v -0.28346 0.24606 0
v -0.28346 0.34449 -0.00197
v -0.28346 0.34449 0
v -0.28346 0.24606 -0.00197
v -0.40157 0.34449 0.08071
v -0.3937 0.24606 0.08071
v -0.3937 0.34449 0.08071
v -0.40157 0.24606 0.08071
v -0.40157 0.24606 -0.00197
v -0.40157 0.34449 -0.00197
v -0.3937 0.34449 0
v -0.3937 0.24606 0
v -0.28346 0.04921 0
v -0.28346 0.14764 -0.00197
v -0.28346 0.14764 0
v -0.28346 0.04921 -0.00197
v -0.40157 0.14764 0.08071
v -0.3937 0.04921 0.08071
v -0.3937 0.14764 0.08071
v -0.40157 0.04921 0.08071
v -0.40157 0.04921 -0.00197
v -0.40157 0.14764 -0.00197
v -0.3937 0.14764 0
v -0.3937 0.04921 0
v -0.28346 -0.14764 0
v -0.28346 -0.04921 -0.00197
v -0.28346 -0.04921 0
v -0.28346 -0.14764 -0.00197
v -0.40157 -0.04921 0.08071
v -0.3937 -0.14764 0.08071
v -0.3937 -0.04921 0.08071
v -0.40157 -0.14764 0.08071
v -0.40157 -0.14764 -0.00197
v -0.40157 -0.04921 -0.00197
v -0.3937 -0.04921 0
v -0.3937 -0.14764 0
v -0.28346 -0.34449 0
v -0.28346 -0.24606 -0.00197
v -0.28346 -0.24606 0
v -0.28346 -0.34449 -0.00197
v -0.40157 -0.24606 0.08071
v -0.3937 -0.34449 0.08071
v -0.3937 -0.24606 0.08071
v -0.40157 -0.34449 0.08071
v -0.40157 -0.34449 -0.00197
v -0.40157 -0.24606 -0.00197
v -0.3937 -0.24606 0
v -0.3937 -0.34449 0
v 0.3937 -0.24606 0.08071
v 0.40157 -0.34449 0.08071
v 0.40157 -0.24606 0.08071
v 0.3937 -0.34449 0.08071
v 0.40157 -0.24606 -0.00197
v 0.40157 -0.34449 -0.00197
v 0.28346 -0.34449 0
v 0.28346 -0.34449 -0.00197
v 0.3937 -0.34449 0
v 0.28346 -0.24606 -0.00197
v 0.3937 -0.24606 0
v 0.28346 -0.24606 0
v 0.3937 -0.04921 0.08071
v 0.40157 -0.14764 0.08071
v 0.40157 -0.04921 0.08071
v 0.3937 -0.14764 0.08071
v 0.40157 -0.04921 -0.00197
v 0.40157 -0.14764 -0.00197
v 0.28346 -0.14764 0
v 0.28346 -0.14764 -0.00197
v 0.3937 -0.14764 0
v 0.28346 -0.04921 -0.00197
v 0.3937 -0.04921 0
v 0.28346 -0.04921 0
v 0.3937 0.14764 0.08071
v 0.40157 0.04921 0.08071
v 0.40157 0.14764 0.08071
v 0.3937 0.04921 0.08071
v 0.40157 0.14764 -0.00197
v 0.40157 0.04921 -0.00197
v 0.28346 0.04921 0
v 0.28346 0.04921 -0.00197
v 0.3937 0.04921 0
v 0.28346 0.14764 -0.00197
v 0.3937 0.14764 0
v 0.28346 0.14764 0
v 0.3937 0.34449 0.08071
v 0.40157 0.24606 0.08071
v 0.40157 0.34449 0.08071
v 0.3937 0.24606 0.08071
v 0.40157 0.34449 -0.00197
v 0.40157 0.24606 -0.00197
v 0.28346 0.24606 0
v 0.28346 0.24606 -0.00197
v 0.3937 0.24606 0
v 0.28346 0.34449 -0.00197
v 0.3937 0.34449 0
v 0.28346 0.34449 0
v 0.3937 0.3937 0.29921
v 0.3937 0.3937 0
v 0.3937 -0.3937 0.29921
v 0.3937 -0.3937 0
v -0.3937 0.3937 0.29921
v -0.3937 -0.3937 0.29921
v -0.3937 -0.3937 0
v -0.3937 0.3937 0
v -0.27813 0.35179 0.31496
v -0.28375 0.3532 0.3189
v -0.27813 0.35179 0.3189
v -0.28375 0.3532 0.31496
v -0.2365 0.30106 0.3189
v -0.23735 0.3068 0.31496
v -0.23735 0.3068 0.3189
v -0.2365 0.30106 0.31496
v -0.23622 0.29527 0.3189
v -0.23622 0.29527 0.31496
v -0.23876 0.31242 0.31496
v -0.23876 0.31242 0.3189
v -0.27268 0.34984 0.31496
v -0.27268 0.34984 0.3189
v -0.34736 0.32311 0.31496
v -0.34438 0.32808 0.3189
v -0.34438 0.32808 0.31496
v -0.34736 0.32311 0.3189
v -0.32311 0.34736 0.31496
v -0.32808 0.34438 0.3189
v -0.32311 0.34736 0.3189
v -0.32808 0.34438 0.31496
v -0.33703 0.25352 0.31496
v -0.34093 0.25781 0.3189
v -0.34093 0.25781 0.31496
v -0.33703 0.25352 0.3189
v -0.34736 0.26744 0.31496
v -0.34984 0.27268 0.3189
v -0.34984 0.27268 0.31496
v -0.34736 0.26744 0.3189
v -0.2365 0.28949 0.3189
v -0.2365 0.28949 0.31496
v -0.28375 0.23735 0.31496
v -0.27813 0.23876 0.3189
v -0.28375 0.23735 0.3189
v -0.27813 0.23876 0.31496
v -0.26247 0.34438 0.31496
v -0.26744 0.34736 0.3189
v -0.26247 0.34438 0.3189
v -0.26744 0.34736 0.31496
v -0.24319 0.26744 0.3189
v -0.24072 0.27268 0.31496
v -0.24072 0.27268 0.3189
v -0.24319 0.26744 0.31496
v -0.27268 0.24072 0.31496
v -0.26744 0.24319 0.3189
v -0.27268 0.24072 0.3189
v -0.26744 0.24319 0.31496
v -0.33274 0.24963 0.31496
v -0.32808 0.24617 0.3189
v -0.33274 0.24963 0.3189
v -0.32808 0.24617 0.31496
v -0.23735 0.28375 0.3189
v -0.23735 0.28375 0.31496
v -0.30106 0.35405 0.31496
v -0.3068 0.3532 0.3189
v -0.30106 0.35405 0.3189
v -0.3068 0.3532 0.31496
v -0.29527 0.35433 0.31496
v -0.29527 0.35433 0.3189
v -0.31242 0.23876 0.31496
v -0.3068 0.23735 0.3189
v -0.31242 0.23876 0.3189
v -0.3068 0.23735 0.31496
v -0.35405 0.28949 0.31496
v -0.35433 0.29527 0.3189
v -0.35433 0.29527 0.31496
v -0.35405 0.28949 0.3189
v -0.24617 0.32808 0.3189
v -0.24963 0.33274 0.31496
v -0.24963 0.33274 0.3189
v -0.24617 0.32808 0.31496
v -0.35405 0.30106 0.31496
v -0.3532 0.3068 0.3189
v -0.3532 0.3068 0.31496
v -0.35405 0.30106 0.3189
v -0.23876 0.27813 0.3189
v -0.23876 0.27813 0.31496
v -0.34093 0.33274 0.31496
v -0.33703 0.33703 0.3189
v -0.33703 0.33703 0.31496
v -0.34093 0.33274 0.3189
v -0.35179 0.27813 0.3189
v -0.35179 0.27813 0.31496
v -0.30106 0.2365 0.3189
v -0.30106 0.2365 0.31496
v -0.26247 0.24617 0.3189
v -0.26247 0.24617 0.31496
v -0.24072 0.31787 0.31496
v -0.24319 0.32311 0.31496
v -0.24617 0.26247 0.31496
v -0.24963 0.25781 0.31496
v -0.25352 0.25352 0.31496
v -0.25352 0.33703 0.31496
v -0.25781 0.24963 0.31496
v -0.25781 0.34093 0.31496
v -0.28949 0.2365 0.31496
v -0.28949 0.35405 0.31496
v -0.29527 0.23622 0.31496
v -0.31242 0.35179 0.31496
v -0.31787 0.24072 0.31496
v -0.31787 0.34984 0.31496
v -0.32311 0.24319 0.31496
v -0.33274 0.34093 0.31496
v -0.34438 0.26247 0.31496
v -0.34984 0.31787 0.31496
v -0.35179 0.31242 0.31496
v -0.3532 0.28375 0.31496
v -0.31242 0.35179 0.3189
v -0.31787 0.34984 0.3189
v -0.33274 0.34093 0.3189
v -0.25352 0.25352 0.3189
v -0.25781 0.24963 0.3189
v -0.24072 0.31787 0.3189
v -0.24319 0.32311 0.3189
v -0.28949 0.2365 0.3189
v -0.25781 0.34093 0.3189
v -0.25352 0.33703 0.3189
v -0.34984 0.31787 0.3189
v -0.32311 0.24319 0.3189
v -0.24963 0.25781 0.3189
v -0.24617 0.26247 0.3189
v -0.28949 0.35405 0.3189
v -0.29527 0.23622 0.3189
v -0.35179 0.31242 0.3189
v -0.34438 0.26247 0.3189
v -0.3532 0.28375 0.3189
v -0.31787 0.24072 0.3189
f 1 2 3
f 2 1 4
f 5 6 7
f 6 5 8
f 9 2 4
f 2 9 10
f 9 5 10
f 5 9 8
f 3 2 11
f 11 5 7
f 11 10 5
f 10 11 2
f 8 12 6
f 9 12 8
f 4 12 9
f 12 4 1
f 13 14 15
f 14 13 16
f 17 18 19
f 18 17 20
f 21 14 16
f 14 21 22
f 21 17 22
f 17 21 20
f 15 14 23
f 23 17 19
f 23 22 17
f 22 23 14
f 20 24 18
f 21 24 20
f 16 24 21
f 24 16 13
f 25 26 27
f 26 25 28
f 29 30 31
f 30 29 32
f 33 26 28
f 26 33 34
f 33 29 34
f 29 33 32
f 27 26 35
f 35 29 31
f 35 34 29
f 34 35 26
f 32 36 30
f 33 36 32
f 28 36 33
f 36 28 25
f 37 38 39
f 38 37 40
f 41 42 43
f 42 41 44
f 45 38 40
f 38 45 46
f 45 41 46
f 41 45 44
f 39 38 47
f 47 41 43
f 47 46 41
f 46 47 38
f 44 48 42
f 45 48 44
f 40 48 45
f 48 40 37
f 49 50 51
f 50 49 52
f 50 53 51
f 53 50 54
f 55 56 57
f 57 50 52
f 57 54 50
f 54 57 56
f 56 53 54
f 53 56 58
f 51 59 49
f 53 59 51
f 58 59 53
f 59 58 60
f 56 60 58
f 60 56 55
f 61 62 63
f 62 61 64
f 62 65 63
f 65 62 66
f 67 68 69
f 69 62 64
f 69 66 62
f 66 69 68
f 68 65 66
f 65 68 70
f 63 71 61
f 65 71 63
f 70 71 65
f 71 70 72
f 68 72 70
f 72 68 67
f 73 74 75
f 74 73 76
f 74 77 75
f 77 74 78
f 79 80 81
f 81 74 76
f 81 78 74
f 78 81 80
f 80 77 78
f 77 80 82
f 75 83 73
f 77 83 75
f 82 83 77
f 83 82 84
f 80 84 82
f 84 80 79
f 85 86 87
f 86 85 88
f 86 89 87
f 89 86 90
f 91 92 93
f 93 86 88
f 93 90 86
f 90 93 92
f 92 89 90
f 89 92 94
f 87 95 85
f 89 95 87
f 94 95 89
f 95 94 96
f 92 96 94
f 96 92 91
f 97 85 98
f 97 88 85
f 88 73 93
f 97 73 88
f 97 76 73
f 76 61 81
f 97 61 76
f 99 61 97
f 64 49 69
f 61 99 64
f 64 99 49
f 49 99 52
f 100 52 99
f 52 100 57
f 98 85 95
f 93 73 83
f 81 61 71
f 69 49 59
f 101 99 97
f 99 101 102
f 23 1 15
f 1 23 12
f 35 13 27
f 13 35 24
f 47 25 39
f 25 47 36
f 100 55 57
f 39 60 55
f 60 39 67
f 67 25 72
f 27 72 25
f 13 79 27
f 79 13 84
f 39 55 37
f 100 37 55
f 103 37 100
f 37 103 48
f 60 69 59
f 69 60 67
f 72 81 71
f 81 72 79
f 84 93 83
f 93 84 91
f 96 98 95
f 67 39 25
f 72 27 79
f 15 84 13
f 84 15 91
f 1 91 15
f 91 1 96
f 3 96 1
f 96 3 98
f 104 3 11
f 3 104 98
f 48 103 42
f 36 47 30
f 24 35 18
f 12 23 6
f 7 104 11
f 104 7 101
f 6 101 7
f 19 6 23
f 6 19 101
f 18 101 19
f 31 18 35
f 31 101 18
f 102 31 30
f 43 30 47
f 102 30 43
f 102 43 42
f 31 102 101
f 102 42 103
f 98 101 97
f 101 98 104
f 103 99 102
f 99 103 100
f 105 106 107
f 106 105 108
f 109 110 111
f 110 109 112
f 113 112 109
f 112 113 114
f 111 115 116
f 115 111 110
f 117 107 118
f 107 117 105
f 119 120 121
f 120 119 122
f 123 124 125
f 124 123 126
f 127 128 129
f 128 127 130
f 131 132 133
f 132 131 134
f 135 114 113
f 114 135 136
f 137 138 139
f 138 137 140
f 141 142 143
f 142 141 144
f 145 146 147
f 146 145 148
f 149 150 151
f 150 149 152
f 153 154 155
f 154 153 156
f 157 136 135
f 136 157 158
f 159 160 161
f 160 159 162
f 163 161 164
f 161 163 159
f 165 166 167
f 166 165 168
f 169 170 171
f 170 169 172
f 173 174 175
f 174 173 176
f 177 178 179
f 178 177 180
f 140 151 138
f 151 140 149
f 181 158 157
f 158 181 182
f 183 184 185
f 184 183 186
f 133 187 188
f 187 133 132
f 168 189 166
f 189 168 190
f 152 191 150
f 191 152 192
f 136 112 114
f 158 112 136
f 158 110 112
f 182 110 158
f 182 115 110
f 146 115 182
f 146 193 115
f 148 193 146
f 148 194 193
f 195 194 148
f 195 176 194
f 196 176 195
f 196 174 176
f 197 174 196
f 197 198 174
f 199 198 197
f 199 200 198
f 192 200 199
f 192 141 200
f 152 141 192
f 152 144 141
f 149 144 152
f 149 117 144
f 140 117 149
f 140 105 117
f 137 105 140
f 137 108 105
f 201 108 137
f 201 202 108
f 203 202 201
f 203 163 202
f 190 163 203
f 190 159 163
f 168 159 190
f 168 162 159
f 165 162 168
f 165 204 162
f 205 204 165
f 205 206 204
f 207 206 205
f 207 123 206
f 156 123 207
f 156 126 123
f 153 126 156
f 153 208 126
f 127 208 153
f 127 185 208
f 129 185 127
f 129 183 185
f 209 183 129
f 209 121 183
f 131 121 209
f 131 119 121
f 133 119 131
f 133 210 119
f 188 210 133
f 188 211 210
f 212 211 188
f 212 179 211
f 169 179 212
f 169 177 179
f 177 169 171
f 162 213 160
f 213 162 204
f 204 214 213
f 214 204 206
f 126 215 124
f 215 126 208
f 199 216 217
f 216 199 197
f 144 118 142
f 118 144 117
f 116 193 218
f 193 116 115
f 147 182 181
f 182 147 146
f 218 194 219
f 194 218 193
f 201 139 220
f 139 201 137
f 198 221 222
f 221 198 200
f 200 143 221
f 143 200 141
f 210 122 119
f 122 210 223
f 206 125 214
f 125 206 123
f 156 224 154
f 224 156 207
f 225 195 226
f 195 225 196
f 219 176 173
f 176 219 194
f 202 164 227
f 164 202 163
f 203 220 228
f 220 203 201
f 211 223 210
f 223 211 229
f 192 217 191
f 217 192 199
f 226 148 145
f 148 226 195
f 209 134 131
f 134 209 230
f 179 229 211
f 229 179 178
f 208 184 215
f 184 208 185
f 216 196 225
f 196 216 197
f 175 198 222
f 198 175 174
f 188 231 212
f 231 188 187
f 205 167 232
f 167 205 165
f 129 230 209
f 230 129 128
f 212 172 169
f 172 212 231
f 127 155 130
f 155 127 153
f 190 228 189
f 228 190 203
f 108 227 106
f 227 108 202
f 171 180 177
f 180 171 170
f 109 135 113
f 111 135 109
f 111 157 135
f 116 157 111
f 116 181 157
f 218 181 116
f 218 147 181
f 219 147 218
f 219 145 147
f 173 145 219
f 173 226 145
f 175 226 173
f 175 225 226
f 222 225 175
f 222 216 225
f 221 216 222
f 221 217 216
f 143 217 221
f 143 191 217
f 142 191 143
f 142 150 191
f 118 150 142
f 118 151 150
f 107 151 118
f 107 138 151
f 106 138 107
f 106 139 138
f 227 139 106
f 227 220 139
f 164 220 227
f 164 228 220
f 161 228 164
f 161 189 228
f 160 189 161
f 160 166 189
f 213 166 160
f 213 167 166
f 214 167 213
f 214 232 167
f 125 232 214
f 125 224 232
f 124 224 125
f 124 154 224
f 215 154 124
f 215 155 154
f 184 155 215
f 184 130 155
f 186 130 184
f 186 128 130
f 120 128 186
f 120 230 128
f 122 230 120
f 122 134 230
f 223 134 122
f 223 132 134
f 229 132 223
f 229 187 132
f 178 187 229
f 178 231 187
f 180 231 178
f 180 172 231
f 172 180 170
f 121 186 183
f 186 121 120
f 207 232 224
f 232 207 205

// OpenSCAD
// file: defines.scad
L = 2.0;  // Длина
W = 2.0;  // Ширина
H = 0.8;  // Высота (от платы, с выводами)
Hf = 0.04;  // Возвышение над платой (высота выводов)
e = 0.5;    // Шаг выводов

pin_fragments = 16;

scale = 1/2.54;
// file: TPS61251-pins.scad
include <defines.scad>

p_w = 0.25;
p_h = 0.3;

p_co = 1.55 - 3*p_h/2 + 0.02;

module Pin(x, y, z, r) {
color("Gold")
  rotate([0,0,r]) translate([x,y,z])
  union() {
    translate([0.25, 0, 0.1]) cube(size = [p_h, p_w, 0.21],center=true); // На боковине
  }
}

scale(scale)
  union() {
    Pin(-p_co, 0.75, 0, 0); // #1
    Pin(-p_co, 0.25, 0, 0); // #2
    Pin(-p_co,-0.25, 0, 0); // #2
    Pin(-p_co,-0.75, 0, 0); // #3

    Pin(-p_co, 0.75, 0, 180); // #4
    Pin(-p_co, 0.25, 0, 180); // #4
    Pin(-p_co,-0.25, 0, 180); // #5
    Pin(-p_co,-0.75, 0, 180); // #6


  };
// file: TPS61251-label.scad
include <defines.scad>

font = "Liberation Sans";
/*font = "DejaVu";*/
/*font = "Abyssinica SIL";*/

f_x = -0.5;
f_y = 1.2;
f_dy = -0.4;
fscale = 0.03;
lab_h = 0.01;

// Label
scale(scale) color("White") {

    /*translate([f_x, f_y+f_dy, H]) {
        scale([fscale,fscale,1])
        linear_extrude(height = lab_h, center=false) {
            text("Texas", font = font);
        }
    }
    translate([f_x, f_y+2*f_dy, H]) {
        scale([fscale,fscale,1])
        linear_extrude(height = lab_h, center=false) {
            text("Instruments", font = font);
        }
    }*/

    translate([-0.75, 0.75, H]) {
        cylinder(r = 0.15, h = lab_h, $fn = 64);
    }

}
// file: TPS61251-body.scad
include <defines.scad>

ox = 1.1/2;
oy = 1.2/2;

scale(scale)
  color([0.15,0.15,0.15])
    translate([0, 0, (H - Hf)/2]) {
        cube([L, W, H - Hf], center = true);
    }
// main file
include <TPS61251-body.scad>
include <TPS61251-label.scad>
include <TPS61251-pins.scad>
